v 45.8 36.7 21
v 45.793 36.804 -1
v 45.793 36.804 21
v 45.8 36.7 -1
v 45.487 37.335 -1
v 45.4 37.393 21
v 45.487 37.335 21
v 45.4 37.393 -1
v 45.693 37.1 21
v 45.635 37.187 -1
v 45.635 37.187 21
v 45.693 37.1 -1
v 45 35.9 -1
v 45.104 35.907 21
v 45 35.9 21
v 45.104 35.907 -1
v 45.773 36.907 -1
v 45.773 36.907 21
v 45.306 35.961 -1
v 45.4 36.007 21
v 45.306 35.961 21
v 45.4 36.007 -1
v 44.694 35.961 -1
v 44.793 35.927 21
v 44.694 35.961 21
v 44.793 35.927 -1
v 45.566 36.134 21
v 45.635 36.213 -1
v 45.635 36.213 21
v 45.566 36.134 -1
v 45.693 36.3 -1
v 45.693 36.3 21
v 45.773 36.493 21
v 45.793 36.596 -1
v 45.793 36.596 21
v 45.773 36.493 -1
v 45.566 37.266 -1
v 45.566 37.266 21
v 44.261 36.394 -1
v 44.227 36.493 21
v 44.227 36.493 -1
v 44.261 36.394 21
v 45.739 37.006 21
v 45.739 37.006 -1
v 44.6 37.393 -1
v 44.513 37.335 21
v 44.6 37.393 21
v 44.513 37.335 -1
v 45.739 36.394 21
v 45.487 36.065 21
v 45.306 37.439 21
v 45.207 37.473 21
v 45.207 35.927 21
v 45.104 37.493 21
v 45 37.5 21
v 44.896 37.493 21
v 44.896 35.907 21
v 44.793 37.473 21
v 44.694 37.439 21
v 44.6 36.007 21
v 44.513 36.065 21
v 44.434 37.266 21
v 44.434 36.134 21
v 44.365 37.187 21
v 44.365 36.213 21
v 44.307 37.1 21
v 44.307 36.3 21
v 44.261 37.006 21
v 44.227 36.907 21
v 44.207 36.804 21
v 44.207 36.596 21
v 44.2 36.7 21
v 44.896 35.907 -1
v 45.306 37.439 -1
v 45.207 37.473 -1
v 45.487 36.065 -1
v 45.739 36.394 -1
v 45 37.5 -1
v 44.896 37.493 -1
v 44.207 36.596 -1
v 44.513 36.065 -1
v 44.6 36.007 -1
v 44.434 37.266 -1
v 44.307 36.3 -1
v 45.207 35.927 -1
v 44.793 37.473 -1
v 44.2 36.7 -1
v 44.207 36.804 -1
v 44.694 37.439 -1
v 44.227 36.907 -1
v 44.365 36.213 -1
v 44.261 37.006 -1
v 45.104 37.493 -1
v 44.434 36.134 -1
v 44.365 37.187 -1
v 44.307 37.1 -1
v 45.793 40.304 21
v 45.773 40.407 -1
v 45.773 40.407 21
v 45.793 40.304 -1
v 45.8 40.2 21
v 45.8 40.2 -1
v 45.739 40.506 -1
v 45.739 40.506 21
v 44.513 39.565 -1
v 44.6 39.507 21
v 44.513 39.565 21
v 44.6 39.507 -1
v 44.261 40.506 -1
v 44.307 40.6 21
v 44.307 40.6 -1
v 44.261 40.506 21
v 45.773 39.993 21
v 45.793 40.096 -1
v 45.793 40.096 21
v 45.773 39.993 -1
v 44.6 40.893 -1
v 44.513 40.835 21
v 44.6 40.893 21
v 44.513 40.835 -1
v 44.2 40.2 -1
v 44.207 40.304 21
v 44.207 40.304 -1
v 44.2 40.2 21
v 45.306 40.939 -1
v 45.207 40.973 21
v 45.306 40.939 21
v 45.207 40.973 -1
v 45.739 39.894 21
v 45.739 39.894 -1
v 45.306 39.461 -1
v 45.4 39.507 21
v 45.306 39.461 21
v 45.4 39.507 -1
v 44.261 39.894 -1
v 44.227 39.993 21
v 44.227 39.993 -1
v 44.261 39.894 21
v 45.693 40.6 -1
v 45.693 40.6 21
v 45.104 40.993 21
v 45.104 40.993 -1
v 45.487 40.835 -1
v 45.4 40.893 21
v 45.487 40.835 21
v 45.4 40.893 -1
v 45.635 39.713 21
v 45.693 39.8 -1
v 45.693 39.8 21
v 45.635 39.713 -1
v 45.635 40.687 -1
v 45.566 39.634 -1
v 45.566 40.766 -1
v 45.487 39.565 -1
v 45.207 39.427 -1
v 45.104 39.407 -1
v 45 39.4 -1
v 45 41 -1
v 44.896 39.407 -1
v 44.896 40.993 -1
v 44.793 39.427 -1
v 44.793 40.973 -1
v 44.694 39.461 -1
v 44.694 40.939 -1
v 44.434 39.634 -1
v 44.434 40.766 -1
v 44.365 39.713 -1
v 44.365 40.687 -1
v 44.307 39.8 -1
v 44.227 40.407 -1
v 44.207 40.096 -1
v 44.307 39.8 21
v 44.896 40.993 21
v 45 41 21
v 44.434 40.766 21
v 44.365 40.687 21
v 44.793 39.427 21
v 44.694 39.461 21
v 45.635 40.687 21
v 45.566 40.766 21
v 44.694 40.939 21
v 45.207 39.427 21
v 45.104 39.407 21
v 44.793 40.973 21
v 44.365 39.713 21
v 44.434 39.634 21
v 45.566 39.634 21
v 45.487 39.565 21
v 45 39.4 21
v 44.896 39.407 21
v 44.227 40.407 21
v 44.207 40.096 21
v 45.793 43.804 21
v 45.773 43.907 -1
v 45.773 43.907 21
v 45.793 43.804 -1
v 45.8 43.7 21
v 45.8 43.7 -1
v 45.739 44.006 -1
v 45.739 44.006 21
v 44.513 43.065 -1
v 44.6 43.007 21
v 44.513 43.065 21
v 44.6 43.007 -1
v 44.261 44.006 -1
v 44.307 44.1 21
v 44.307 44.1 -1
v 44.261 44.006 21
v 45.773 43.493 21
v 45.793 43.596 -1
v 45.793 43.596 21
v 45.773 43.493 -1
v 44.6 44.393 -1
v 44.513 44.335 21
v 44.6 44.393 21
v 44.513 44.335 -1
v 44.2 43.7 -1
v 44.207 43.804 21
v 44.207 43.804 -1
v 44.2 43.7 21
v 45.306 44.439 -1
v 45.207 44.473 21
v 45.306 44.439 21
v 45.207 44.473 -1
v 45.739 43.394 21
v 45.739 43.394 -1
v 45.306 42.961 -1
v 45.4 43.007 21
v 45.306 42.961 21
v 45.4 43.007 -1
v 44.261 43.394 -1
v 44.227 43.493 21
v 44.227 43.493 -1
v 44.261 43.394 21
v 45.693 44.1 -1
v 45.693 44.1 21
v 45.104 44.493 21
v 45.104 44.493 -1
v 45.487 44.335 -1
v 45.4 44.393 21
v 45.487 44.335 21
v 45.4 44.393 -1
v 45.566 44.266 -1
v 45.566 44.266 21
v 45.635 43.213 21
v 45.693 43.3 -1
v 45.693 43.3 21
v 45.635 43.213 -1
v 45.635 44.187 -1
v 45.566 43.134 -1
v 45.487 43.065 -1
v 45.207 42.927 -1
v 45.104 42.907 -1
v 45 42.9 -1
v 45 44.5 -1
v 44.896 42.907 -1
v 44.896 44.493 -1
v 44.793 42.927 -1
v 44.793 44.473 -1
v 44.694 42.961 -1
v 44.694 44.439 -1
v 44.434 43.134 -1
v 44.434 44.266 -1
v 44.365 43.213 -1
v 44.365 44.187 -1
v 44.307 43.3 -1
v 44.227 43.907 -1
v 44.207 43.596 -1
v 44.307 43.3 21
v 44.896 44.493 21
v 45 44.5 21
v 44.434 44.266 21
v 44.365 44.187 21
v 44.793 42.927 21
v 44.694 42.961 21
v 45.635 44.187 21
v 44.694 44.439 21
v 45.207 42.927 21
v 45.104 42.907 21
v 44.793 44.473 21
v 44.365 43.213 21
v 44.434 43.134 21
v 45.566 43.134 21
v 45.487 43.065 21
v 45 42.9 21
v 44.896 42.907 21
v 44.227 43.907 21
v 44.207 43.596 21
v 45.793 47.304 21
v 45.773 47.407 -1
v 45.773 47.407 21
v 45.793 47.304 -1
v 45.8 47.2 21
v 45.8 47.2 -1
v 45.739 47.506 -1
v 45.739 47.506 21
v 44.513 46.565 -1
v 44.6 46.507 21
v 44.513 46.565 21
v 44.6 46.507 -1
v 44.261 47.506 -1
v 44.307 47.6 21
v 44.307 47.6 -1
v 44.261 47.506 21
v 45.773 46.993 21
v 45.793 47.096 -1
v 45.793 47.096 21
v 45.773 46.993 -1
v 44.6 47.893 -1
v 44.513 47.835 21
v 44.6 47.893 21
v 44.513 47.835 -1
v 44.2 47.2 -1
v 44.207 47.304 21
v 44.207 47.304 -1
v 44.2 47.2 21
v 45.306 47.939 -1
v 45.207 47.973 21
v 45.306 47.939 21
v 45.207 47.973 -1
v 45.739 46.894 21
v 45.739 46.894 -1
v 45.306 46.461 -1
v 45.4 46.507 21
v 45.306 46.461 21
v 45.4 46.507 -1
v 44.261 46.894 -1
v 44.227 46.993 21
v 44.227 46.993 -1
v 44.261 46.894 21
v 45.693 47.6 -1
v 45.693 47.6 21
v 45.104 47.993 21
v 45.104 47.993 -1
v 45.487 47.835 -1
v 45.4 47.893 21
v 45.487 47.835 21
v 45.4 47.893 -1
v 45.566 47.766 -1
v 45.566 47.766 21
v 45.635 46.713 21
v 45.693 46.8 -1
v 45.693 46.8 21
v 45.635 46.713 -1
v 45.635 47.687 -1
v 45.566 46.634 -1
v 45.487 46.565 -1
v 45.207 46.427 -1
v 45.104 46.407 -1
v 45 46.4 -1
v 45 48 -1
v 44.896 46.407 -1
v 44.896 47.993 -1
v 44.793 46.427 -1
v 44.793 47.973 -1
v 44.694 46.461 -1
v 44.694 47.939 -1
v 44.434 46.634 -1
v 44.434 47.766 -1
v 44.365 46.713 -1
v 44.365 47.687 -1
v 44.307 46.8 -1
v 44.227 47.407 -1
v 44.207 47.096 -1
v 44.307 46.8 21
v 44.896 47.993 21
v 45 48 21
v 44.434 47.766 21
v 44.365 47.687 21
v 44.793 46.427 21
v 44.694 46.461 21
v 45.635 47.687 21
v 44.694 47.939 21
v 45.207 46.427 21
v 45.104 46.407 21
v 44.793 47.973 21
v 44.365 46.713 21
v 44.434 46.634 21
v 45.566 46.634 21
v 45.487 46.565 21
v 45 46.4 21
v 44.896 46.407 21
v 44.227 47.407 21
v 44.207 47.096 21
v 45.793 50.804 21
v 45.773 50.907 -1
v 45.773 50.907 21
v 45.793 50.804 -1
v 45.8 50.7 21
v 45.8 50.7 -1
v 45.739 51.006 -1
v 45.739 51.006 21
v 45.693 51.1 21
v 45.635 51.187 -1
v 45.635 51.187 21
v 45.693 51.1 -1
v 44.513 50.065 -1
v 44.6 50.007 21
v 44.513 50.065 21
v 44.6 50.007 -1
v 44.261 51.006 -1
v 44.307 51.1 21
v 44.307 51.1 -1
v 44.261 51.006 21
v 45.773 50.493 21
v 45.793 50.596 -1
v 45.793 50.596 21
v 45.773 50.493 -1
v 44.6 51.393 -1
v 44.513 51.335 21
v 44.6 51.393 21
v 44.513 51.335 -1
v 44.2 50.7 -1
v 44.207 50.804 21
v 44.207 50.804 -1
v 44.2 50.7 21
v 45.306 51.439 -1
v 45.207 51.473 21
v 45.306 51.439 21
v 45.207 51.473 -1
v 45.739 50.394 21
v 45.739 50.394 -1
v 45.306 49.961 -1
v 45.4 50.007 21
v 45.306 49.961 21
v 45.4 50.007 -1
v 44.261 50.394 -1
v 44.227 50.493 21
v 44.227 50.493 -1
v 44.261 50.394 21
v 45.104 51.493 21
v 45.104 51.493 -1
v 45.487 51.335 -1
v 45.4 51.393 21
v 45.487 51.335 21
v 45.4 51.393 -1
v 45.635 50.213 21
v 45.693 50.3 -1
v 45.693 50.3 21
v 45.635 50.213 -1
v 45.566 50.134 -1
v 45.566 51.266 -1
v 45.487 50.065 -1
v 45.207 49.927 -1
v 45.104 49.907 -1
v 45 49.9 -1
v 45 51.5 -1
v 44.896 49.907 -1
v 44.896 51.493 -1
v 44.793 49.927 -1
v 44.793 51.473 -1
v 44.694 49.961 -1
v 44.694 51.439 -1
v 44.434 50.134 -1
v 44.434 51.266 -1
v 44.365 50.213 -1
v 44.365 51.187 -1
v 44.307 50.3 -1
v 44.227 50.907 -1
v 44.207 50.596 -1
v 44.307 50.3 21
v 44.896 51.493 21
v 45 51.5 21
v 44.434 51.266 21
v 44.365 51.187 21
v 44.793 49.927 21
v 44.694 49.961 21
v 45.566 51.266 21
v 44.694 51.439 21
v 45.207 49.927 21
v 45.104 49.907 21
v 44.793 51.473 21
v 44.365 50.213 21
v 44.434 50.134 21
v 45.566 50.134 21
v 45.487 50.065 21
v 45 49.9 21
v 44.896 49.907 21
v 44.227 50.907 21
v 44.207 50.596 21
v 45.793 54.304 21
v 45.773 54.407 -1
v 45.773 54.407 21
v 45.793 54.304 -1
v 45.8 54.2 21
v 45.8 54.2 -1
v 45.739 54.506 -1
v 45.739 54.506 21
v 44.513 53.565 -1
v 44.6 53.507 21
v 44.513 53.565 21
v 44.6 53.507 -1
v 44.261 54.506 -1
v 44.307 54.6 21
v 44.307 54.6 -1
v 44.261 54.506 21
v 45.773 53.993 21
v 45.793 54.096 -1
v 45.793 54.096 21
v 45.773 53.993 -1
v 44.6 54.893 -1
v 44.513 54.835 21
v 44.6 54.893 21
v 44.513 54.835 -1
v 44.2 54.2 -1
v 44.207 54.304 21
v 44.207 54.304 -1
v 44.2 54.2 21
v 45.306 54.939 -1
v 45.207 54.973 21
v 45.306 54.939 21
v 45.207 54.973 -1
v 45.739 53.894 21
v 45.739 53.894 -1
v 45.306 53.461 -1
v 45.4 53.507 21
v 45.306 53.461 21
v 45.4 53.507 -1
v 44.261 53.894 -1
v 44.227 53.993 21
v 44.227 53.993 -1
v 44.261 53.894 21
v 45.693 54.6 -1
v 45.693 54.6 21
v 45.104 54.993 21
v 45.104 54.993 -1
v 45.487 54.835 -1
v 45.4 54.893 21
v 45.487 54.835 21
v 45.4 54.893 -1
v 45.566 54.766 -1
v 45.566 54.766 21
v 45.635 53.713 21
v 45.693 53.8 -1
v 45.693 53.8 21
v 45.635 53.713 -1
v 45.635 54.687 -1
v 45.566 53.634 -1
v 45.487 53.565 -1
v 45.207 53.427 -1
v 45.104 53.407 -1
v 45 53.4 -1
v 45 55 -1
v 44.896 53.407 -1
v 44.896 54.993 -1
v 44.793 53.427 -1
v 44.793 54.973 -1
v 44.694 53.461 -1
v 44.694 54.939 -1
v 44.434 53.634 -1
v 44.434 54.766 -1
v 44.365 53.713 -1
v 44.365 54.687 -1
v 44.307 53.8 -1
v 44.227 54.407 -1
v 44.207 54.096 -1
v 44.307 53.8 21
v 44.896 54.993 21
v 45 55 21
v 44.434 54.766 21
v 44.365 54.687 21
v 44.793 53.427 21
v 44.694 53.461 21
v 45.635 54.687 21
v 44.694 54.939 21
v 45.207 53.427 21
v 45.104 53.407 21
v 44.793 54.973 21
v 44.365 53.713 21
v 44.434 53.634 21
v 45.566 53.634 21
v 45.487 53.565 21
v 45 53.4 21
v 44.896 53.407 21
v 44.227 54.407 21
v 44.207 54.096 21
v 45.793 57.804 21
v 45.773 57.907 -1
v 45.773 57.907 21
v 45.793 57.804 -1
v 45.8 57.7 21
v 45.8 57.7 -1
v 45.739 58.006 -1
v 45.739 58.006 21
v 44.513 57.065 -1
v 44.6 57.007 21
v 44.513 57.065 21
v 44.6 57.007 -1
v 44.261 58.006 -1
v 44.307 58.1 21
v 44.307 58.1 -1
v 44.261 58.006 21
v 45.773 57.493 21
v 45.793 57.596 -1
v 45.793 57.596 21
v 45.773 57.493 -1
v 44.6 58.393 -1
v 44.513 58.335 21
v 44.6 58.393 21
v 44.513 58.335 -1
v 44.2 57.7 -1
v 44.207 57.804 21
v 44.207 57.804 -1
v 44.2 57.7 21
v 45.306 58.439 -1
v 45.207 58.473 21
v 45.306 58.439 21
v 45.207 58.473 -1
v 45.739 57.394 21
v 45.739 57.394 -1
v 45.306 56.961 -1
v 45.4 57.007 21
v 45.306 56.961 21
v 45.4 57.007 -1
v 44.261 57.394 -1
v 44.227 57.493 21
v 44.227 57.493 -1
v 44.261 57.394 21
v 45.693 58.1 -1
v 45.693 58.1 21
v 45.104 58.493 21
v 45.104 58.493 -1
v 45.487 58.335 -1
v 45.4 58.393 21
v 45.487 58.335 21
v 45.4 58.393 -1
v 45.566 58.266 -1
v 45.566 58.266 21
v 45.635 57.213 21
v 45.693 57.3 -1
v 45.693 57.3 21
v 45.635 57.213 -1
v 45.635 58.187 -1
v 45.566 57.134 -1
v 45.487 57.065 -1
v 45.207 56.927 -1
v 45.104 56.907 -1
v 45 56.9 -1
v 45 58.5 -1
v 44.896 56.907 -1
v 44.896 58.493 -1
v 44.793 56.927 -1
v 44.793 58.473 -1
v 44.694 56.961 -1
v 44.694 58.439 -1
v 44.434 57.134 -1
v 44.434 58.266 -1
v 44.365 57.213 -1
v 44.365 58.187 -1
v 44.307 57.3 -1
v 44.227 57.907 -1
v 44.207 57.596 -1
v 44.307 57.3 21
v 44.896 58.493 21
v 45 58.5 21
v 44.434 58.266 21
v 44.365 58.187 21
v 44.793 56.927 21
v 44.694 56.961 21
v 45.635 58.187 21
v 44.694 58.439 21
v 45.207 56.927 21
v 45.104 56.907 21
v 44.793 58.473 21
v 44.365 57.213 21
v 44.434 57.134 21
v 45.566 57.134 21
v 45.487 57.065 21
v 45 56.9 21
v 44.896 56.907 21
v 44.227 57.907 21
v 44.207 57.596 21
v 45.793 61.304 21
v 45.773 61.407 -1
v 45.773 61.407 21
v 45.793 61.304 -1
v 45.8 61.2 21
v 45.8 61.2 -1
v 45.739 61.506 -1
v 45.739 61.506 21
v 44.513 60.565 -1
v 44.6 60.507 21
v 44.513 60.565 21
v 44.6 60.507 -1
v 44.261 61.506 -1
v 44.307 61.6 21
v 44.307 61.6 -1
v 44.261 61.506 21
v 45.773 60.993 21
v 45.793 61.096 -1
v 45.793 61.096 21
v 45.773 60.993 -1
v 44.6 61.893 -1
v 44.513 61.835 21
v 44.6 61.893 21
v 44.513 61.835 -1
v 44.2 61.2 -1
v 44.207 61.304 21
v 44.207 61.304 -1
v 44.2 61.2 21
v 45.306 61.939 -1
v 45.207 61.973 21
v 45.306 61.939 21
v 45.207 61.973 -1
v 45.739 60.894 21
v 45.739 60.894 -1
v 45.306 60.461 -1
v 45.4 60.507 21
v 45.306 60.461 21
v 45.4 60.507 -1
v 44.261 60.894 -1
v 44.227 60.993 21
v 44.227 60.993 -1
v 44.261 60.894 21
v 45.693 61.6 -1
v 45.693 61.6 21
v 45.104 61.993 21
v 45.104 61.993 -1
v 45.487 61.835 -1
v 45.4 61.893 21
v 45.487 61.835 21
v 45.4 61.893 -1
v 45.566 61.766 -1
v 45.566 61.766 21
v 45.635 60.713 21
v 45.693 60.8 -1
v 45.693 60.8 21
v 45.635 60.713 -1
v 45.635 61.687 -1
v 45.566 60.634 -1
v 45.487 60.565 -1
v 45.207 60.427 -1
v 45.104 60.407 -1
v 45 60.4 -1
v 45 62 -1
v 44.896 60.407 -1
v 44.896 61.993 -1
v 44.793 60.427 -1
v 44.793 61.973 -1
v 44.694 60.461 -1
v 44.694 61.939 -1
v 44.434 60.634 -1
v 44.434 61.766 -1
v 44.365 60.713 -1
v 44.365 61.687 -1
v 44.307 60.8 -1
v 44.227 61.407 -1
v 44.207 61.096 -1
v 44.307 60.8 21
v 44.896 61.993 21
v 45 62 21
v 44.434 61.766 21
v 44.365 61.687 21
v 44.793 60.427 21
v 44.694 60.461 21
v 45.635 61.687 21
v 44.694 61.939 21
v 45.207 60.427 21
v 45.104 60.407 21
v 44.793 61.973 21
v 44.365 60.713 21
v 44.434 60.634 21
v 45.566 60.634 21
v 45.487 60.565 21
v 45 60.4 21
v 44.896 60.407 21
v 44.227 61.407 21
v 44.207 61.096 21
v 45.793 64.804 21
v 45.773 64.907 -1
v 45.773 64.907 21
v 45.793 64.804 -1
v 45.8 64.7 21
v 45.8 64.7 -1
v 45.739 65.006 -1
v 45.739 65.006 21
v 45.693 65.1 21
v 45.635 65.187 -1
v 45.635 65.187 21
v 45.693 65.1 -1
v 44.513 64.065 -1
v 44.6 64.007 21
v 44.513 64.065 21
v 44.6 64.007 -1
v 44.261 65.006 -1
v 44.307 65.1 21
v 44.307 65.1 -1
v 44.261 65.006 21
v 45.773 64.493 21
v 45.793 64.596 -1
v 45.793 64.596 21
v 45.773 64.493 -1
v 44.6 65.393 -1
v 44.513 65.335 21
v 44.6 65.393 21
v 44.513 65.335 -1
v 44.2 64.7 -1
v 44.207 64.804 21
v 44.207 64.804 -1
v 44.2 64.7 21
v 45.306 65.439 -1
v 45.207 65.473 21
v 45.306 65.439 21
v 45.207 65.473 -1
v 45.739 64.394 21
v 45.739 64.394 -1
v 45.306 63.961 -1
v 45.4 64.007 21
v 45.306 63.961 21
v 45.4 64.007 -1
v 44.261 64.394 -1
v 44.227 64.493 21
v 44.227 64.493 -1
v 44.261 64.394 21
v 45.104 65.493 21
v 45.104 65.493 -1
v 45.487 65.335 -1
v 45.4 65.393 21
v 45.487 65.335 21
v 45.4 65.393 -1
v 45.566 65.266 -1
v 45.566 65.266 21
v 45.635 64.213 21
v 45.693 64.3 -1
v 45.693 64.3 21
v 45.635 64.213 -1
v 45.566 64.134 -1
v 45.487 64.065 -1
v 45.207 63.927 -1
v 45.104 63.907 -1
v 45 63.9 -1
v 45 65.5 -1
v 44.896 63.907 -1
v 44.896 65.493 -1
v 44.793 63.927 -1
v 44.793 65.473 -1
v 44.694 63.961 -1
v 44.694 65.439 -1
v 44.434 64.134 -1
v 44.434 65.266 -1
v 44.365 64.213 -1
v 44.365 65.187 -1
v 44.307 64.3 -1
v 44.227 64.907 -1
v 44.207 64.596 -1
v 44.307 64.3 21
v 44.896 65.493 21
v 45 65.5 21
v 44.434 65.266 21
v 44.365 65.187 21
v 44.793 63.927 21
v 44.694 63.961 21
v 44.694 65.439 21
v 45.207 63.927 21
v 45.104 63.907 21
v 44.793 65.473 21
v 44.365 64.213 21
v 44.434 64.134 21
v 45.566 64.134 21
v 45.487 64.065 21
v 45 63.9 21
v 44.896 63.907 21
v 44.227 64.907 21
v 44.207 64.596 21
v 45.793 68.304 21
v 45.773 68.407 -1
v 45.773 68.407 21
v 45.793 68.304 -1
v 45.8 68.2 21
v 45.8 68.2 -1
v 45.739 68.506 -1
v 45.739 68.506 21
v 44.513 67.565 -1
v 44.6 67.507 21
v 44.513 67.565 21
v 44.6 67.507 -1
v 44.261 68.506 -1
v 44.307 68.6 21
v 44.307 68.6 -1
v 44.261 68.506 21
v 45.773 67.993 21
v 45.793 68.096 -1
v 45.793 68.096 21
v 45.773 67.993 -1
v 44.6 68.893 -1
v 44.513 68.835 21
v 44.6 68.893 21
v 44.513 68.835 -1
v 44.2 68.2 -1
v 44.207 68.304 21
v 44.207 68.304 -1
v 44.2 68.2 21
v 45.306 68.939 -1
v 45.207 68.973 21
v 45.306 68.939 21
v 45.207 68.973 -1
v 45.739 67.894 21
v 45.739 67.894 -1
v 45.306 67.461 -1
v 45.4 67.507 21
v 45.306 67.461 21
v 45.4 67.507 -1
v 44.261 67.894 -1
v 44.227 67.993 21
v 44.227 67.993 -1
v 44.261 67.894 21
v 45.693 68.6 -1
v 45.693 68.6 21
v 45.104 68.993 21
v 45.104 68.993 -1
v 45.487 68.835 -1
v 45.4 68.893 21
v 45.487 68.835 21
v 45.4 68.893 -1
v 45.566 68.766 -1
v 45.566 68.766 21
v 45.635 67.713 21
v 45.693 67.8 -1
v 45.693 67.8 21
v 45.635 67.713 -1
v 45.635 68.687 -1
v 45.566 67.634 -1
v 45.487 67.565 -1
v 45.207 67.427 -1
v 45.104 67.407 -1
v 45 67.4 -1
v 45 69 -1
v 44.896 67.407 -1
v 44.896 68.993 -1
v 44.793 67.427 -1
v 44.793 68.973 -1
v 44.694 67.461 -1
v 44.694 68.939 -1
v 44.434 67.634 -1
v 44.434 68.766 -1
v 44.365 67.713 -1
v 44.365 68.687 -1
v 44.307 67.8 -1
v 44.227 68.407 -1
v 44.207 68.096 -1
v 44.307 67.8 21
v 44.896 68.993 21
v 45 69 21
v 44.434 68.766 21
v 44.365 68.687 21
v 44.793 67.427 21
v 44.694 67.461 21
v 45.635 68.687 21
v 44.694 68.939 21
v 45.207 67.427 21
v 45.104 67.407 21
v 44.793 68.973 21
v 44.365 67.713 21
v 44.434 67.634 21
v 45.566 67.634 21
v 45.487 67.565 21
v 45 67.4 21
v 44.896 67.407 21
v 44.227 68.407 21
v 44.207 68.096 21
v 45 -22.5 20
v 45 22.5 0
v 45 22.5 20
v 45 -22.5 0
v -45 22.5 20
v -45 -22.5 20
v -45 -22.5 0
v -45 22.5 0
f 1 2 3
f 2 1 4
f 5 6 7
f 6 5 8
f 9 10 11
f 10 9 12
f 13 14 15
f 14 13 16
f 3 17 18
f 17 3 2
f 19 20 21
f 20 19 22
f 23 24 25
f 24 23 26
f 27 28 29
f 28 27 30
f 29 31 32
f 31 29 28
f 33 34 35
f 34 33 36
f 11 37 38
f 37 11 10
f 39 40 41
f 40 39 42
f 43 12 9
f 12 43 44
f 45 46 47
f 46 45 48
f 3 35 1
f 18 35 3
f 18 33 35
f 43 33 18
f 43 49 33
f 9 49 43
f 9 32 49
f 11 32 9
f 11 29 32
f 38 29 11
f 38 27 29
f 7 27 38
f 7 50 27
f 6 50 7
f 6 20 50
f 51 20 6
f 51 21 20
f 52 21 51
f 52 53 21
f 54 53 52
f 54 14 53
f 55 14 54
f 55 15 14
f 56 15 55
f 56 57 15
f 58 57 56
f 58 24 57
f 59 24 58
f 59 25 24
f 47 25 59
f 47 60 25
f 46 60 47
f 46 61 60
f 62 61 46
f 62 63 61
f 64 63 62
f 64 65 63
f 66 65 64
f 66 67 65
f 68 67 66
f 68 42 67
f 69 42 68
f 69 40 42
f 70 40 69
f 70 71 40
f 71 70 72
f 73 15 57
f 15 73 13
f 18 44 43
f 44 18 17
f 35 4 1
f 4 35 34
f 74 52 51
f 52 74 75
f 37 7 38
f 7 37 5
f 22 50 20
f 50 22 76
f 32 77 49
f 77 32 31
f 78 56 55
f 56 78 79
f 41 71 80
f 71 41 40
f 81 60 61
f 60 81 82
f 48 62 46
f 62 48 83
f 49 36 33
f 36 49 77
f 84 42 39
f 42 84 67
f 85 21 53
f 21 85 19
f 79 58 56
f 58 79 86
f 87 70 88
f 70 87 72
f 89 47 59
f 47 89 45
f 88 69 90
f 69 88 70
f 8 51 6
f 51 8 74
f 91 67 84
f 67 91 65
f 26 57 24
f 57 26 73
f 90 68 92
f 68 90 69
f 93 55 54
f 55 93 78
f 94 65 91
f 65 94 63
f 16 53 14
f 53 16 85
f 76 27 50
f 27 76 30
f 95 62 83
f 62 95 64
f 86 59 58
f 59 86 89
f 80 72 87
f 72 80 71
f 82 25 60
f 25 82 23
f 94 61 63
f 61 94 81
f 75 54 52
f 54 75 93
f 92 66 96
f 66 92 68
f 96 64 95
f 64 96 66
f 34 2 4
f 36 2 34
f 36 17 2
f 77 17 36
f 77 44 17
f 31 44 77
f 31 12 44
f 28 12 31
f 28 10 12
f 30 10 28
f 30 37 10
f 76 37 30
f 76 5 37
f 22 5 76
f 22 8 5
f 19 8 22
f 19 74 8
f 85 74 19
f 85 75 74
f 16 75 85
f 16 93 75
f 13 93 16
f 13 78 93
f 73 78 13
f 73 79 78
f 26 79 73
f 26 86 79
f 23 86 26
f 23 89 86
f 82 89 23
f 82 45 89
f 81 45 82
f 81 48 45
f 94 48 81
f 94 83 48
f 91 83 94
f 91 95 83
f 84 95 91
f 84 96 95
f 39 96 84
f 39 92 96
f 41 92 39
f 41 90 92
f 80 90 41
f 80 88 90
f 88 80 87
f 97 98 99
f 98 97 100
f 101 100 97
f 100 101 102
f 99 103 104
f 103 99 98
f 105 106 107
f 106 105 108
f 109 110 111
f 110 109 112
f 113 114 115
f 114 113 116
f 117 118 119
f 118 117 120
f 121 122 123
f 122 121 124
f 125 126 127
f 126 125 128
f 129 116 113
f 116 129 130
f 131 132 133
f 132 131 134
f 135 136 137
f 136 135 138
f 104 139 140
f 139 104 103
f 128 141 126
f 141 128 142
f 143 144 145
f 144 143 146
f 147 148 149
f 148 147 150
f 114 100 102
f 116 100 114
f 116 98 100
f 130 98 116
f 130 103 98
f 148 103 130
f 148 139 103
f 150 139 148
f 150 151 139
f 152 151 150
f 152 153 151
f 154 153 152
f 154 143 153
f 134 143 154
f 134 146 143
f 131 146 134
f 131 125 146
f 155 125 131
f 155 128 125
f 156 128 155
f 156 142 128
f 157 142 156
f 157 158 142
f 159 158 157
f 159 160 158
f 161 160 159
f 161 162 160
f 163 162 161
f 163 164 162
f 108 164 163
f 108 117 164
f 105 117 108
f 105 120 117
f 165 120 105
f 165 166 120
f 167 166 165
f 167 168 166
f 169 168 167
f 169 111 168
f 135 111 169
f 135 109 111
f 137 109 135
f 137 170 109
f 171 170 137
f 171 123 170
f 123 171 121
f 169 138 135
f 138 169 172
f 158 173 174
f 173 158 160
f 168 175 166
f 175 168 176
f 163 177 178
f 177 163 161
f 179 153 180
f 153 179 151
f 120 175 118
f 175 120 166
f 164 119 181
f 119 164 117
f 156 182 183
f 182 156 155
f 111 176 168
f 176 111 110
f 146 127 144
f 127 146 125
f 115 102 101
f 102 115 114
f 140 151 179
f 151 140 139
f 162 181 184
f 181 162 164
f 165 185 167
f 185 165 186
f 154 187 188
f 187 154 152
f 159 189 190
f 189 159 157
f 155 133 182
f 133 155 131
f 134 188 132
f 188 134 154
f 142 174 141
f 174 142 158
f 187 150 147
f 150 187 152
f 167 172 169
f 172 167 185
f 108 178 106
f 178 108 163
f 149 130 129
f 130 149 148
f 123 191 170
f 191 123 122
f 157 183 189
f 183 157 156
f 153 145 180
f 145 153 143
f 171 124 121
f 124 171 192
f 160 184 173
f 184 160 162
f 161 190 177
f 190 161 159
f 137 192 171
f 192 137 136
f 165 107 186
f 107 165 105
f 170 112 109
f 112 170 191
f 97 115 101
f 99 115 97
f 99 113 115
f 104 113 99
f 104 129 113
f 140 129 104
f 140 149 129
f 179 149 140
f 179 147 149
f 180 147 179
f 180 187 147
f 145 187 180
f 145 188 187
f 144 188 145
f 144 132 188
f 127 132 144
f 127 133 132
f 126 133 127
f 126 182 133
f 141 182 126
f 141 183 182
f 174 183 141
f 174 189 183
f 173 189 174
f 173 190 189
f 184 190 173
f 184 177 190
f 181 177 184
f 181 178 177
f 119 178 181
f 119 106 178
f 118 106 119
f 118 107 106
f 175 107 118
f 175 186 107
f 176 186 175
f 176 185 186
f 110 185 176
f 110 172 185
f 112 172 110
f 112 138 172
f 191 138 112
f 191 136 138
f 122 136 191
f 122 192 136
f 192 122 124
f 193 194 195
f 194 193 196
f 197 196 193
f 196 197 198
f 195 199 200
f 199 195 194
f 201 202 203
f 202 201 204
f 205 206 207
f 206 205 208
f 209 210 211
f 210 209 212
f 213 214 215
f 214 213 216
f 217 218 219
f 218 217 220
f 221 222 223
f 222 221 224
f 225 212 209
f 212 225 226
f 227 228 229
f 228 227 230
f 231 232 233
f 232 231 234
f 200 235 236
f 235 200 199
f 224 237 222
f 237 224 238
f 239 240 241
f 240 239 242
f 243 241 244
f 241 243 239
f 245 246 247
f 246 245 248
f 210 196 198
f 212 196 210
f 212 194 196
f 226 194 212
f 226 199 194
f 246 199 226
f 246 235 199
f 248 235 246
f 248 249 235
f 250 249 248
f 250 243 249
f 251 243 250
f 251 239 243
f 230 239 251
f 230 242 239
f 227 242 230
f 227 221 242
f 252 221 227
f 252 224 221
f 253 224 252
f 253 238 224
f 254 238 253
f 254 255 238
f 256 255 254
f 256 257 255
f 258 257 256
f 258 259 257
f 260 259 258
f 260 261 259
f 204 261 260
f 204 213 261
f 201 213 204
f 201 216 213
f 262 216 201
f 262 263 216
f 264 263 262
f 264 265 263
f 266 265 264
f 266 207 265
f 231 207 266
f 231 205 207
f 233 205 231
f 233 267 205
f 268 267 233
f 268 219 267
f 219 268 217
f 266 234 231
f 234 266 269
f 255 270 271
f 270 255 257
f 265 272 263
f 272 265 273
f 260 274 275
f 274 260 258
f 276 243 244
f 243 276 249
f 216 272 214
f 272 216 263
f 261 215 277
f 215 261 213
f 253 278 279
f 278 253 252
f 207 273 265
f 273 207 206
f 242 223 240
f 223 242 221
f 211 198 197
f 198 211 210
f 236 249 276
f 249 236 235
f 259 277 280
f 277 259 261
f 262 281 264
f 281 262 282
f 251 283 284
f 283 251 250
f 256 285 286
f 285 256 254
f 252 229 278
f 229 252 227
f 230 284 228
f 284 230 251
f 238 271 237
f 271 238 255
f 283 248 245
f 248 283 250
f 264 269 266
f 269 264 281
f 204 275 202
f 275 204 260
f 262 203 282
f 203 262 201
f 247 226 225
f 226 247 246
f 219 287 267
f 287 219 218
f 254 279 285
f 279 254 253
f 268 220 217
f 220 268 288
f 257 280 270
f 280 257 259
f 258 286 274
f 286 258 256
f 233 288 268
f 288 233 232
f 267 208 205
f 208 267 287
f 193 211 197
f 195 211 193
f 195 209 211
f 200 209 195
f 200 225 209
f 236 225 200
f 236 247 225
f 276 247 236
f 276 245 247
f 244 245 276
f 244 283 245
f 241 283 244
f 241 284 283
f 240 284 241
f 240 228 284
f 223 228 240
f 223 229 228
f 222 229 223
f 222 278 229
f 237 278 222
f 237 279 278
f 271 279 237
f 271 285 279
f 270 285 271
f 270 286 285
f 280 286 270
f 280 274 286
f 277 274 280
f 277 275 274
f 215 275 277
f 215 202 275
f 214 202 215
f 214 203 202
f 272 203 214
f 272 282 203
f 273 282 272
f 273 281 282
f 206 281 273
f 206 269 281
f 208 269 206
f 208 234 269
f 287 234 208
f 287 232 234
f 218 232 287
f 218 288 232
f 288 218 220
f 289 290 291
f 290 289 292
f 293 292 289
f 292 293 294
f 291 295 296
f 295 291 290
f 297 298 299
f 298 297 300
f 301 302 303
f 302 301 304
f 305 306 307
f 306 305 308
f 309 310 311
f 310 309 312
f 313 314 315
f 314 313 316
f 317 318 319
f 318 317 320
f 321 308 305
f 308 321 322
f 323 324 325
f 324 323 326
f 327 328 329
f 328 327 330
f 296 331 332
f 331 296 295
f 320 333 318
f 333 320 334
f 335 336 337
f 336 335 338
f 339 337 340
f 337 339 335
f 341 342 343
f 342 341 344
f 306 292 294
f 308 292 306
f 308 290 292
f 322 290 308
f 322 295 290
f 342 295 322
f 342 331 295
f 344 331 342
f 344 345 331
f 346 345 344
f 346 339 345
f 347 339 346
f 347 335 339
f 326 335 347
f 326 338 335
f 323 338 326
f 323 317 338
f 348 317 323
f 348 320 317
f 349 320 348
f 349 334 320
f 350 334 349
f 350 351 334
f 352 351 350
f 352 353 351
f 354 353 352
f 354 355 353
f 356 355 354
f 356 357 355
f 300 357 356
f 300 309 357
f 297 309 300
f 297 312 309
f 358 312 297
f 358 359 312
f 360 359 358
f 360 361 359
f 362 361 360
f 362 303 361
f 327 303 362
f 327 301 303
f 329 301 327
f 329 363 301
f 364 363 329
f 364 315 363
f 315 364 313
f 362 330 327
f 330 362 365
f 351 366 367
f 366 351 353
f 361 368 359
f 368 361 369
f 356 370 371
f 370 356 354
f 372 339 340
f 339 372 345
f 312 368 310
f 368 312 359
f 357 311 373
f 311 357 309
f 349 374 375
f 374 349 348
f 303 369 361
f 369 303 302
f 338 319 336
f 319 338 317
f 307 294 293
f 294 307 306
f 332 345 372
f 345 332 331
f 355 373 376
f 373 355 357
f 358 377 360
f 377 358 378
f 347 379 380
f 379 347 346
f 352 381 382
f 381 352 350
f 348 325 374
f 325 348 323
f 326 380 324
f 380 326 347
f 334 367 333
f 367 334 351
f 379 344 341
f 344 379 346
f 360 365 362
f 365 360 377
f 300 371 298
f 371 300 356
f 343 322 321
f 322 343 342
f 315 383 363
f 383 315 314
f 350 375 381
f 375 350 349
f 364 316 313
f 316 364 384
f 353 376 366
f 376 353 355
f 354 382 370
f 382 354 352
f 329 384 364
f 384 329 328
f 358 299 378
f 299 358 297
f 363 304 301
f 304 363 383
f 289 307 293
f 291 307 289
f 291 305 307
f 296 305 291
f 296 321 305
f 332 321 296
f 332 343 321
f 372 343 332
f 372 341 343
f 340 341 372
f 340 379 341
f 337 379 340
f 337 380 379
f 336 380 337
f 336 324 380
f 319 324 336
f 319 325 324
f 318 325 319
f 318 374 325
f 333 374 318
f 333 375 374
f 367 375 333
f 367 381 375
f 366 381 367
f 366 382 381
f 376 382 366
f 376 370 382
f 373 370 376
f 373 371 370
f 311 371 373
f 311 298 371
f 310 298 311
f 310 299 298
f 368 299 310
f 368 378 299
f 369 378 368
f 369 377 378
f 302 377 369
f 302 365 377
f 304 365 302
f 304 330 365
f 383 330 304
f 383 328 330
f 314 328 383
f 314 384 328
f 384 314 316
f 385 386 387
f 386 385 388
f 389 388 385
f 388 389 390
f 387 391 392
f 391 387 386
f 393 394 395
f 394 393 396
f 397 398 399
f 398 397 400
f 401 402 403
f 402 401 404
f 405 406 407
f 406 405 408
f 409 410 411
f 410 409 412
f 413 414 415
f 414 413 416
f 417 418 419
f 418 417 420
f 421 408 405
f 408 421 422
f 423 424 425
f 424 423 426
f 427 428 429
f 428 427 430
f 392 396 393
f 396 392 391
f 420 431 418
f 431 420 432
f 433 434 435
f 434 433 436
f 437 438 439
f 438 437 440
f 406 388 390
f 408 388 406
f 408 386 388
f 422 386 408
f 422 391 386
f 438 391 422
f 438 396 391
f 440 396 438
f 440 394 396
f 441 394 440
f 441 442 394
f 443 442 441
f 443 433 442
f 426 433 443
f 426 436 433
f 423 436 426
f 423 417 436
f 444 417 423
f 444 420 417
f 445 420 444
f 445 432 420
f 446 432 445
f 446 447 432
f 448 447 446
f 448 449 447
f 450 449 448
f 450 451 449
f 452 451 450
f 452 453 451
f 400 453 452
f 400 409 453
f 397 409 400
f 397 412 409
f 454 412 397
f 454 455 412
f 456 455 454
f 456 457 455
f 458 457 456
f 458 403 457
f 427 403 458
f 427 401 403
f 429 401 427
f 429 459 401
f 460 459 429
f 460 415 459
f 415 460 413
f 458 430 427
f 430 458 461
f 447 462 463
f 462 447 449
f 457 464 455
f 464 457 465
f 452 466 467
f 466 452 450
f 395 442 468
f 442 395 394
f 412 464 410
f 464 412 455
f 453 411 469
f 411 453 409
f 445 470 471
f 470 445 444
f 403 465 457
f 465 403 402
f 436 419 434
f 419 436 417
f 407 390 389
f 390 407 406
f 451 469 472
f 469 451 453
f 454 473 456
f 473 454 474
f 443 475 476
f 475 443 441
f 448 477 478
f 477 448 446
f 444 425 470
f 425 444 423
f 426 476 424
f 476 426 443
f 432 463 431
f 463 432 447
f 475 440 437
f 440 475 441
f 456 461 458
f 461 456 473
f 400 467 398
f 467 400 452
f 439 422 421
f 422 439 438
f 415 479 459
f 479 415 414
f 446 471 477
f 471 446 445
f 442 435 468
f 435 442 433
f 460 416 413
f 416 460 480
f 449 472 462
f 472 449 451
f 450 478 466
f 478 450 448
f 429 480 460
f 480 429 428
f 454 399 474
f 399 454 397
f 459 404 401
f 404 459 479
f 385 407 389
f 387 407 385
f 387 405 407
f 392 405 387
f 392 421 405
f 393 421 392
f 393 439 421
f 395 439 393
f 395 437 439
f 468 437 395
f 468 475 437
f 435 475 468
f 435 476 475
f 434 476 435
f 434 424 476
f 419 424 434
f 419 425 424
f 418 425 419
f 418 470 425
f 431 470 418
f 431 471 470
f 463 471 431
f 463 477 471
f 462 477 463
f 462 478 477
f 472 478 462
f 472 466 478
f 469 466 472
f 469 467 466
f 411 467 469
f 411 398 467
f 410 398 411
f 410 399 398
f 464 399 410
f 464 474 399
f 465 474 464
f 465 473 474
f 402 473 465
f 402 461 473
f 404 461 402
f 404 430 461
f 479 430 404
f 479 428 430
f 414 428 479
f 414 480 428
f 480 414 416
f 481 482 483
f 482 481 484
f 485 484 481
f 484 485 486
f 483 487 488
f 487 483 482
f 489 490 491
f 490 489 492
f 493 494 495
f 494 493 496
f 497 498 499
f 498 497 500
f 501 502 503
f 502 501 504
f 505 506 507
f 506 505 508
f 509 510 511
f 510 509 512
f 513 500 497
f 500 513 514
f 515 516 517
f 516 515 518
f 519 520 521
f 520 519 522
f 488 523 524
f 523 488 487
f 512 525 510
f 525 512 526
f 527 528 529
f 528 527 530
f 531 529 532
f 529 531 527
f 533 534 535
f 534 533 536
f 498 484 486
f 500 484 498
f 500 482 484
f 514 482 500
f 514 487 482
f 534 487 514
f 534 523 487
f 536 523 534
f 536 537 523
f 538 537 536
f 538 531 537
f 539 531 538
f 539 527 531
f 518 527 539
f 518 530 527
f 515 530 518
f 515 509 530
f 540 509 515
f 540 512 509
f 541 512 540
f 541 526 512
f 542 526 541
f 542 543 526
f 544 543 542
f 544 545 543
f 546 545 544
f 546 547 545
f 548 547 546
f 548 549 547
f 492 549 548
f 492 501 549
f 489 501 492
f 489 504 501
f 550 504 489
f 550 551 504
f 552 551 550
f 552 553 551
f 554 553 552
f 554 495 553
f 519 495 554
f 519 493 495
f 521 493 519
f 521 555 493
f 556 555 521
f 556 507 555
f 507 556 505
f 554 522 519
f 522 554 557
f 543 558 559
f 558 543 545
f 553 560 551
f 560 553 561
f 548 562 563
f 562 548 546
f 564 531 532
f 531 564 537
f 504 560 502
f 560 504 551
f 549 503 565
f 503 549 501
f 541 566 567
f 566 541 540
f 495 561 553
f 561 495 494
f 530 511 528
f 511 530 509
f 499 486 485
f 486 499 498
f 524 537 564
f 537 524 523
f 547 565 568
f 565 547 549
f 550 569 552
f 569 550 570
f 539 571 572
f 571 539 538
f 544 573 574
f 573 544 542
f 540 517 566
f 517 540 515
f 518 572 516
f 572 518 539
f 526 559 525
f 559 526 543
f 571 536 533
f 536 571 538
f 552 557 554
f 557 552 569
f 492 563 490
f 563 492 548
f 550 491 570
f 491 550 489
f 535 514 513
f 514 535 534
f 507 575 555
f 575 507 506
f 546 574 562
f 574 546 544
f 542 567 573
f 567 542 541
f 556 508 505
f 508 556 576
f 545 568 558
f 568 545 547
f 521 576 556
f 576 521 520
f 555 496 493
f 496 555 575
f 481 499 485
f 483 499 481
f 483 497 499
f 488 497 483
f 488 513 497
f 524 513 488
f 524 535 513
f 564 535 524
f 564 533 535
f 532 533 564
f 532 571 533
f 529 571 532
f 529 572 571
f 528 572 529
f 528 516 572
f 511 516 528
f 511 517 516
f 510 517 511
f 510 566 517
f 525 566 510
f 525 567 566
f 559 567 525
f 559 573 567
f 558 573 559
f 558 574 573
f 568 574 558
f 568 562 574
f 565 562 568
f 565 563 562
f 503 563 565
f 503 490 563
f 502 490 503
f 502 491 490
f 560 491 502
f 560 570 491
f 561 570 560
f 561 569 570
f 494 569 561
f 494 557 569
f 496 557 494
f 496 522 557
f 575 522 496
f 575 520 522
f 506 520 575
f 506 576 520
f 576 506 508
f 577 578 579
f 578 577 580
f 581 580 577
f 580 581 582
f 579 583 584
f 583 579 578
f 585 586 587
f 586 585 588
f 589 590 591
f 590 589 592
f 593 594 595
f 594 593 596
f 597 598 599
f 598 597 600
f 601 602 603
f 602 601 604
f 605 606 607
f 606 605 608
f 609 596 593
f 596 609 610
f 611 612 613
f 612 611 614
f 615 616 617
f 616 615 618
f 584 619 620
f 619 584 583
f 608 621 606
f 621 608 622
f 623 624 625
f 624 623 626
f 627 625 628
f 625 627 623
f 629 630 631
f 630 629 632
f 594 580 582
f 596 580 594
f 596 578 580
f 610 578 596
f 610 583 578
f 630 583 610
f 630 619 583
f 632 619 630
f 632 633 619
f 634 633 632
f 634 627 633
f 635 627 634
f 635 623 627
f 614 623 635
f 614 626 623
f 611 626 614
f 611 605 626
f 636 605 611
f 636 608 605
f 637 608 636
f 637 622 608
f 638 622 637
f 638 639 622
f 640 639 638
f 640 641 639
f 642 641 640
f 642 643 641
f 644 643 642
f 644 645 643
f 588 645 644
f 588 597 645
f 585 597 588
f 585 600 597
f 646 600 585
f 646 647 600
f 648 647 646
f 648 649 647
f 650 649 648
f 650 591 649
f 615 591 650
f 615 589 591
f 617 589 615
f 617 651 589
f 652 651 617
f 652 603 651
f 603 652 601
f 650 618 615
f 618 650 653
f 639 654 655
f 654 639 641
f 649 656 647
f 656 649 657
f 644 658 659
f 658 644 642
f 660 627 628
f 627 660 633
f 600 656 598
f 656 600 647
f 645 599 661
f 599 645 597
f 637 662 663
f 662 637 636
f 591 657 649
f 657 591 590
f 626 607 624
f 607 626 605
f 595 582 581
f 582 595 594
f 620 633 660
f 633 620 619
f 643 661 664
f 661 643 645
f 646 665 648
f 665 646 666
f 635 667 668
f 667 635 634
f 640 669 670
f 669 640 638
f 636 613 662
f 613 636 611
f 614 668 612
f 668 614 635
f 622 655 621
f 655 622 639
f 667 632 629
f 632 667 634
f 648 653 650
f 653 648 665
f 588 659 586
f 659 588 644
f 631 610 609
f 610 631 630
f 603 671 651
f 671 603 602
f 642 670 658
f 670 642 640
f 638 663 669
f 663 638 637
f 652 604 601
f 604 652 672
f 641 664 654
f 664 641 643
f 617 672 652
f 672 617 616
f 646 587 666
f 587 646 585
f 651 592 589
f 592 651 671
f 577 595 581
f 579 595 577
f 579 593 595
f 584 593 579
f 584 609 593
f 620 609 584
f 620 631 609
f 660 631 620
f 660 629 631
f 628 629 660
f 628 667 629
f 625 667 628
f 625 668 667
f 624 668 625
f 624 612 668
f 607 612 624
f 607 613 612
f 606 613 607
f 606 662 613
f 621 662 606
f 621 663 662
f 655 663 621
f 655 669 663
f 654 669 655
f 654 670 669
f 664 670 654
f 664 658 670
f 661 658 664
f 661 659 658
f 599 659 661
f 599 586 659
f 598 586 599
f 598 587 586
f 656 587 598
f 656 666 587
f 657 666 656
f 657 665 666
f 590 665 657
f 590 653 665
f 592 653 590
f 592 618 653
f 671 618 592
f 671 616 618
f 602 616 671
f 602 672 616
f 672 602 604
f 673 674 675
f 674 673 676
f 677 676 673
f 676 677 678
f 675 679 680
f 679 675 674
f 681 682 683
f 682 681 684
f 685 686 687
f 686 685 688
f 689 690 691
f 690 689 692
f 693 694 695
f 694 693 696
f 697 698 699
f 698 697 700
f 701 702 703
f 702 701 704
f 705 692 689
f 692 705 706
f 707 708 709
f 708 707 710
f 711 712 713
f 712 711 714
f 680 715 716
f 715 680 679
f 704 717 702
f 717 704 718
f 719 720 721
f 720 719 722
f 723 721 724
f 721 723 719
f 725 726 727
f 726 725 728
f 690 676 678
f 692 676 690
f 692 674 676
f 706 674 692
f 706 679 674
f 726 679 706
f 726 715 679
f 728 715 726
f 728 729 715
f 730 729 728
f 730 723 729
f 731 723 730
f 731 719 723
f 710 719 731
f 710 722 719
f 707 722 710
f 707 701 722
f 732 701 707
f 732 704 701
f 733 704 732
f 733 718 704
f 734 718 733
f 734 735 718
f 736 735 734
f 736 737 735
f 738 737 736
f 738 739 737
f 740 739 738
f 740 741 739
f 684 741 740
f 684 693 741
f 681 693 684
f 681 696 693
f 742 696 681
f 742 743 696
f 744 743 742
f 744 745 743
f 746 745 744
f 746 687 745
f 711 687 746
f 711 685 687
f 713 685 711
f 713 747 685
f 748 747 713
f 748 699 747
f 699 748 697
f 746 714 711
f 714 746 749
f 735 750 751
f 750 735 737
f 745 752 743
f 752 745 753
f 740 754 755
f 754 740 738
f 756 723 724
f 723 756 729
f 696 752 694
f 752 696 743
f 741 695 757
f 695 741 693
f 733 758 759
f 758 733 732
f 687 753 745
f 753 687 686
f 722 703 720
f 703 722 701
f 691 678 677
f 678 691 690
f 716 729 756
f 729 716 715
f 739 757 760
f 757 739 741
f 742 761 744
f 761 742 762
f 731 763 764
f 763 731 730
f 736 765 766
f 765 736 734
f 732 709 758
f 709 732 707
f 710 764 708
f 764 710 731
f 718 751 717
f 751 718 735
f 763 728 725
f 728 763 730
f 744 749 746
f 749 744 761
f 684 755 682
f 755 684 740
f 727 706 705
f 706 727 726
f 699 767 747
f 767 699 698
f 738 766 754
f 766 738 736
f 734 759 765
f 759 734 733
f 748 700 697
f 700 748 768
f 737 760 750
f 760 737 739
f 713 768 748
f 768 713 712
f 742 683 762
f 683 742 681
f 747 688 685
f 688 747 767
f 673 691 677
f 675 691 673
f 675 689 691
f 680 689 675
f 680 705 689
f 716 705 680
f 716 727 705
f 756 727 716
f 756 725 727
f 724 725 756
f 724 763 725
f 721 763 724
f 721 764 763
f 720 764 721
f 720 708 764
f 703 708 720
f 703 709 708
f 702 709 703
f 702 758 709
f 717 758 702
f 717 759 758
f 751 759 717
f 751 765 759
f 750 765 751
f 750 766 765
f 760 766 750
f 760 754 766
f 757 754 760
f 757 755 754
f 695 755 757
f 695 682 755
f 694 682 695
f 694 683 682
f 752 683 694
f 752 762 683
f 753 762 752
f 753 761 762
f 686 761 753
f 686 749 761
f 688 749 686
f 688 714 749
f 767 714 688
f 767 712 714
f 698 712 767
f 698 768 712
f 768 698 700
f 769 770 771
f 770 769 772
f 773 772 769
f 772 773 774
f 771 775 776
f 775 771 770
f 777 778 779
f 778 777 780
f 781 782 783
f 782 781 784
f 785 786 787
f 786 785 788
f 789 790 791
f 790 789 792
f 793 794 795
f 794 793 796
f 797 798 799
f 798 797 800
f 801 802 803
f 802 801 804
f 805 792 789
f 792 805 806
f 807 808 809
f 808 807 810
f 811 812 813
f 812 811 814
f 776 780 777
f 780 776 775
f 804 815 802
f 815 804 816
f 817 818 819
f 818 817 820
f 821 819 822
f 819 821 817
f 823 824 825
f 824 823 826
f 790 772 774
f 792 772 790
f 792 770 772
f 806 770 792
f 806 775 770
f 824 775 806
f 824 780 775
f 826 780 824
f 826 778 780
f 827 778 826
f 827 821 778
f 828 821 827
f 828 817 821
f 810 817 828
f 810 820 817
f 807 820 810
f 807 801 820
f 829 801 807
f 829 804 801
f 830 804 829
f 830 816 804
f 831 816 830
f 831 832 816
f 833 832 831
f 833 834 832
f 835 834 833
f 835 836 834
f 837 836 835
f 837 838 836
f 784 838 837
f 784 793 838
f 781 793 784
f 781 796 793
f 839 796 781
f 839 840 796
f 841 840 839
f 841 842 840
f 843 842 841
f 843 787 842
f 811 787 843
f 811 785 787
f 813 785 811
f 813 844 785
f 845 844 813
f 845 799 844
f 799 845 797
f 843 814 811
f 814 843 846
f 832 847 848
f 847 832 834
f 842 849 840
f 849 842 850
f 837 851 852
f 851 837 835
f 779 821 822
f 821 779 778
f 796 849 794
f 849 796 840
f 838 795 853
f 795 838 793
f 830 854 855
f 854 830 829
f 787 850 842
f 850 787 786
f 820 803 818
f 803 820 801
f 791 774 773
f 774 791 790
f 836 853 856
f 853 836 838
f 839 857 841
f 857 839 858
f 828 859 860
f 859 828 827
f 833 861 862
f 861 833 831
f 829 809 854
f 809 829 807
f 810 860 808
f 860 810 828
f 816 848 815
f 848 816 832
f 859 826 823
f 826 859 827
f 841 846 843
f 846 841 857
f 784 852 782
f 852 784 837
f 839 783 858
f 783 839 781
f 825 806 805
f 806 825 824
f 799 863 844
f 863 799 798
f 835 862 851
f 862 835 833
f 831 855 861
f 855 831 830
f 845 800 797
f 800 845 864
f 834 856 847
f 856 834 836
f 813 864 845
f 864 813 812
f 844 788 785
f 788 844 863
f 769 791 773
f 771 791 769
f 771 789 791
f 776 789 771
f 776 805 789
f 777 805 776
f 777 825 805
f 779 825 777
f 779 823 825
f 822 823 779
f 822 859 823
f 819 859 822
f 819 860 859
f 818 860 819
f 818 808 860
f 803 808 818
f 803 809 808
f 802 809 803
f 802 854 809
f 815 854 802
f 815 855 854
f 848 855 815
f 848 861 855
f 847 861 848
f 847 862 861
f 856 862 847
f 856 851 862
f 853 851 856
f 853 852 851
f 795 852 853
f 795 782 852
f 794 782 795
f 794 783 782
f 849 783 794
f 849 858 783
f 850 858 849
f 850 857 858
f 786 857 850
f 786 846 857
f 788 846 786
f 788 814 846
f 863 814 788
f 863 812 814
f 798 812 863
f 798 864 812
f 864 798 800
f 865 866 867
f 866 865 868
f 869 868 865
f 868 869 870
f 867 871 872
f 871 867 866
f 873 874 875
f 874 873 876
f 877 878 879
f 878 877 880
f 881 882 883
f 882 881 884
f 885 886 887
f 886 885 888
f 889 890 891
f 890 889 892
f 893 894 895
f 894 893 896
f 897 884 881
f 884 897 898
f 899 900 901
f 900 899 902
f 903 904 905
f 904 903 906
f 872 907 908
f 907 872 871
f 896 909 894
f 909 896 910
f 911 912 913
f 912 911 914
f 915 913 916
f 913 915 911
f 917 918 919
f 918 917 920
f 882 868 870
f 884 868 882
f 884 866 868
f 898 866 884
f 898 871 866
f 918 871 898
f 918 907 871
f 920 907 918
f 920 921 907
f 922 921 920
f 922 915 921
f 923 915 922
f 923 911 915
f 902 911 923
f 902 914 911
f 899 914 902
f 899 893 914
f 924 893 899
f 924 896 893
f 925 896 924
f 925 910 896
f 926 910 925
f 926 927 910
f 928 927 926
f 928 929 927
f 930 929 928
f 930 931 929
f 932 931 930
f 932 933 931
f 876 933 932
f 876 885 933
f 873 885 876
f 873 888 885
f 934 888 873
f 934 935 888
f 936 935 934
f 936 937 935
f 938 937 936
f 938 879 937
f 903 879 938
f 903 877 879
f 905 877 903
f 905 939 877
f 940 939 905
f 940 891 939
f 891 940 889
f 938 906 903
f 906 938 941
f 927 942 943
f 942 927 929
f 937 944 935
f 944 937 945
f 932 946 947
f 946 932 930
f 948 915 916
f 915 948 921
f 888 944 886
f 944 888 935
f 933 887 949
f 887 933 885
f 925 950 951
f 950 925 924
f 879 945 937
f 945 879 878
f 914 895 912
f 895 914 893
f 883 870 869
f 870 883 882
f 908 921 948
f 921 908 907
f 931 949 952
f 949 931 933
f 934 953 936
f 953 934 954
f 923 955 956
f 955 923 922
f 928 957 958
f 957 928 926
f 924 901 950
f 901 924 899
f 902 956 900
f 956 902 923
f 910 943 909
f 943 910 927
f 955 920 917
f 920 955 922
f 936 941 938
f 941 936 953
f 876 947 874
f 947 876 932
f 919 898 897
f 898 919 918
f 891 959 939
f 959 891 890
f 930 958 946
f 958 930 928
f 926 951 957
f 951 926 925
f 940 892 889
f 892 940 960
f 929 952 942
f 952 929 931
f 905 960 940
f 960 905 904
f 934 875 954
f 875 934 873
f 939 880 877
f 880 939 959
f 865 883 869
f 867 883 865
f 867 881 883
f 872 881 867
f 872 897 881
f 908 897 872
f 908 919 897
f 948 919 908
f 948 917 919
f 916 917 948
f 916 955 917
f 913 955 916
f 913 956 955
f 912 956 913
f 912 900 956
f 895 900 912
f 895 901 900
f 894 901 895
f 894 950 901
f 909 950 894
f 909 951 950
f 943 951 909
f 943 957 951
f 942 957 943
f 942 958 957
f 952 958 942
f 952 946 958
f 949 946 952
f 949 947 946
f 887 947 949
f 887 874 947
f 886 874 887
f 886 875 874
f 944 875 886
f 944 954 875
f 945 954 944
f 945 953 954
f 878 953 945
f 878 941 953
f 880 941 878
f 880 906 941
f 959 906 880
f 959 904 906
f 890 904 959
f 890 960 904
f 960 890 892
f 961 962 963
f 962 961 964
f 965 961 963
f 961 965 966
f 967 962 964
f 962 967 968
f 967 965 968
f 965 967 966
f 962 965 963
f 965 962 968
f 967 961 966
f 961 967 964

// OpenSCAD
// Drying rack for microscope slides - a solid base block with a row of parallel slots open at the
// top, so slides standing on their long edge are half immersed in water and dry upright. NOVEL
// general part (a generic "slide rack" rather than any one lab's part).
//

slides   = 10;
slide_w  = 75;
slide_h  = 25;
slide_t  = 1;
base_l   = 90;
base_w   = 45;
base_h   = 20;
slot_l   = 77;
slot_w   = 1.6;
slot_d   = 10;
pitch    = 3.5;

$fn = 48;

slot_y = slide_w / 2 - slot_w / 2;          // first slot centre in Y
for (i = [0 : slides - 1])
    translate([base_l / 2, slot_y + i * pitch, -1]) cylinder(h = base_h + 2, d = slot_w);   // cut the slots

difference() {
    translate([-base_l / 2, -base_w / 2, 0]) cube([base_l, base_w, base_h]);
    for (i = [0 : slides - 1])
        translate([base_l / 2, slot_y + i * pitch, -1]) cylinder(h = base_h + 2, d = slot_w);   // cut the slots
}
